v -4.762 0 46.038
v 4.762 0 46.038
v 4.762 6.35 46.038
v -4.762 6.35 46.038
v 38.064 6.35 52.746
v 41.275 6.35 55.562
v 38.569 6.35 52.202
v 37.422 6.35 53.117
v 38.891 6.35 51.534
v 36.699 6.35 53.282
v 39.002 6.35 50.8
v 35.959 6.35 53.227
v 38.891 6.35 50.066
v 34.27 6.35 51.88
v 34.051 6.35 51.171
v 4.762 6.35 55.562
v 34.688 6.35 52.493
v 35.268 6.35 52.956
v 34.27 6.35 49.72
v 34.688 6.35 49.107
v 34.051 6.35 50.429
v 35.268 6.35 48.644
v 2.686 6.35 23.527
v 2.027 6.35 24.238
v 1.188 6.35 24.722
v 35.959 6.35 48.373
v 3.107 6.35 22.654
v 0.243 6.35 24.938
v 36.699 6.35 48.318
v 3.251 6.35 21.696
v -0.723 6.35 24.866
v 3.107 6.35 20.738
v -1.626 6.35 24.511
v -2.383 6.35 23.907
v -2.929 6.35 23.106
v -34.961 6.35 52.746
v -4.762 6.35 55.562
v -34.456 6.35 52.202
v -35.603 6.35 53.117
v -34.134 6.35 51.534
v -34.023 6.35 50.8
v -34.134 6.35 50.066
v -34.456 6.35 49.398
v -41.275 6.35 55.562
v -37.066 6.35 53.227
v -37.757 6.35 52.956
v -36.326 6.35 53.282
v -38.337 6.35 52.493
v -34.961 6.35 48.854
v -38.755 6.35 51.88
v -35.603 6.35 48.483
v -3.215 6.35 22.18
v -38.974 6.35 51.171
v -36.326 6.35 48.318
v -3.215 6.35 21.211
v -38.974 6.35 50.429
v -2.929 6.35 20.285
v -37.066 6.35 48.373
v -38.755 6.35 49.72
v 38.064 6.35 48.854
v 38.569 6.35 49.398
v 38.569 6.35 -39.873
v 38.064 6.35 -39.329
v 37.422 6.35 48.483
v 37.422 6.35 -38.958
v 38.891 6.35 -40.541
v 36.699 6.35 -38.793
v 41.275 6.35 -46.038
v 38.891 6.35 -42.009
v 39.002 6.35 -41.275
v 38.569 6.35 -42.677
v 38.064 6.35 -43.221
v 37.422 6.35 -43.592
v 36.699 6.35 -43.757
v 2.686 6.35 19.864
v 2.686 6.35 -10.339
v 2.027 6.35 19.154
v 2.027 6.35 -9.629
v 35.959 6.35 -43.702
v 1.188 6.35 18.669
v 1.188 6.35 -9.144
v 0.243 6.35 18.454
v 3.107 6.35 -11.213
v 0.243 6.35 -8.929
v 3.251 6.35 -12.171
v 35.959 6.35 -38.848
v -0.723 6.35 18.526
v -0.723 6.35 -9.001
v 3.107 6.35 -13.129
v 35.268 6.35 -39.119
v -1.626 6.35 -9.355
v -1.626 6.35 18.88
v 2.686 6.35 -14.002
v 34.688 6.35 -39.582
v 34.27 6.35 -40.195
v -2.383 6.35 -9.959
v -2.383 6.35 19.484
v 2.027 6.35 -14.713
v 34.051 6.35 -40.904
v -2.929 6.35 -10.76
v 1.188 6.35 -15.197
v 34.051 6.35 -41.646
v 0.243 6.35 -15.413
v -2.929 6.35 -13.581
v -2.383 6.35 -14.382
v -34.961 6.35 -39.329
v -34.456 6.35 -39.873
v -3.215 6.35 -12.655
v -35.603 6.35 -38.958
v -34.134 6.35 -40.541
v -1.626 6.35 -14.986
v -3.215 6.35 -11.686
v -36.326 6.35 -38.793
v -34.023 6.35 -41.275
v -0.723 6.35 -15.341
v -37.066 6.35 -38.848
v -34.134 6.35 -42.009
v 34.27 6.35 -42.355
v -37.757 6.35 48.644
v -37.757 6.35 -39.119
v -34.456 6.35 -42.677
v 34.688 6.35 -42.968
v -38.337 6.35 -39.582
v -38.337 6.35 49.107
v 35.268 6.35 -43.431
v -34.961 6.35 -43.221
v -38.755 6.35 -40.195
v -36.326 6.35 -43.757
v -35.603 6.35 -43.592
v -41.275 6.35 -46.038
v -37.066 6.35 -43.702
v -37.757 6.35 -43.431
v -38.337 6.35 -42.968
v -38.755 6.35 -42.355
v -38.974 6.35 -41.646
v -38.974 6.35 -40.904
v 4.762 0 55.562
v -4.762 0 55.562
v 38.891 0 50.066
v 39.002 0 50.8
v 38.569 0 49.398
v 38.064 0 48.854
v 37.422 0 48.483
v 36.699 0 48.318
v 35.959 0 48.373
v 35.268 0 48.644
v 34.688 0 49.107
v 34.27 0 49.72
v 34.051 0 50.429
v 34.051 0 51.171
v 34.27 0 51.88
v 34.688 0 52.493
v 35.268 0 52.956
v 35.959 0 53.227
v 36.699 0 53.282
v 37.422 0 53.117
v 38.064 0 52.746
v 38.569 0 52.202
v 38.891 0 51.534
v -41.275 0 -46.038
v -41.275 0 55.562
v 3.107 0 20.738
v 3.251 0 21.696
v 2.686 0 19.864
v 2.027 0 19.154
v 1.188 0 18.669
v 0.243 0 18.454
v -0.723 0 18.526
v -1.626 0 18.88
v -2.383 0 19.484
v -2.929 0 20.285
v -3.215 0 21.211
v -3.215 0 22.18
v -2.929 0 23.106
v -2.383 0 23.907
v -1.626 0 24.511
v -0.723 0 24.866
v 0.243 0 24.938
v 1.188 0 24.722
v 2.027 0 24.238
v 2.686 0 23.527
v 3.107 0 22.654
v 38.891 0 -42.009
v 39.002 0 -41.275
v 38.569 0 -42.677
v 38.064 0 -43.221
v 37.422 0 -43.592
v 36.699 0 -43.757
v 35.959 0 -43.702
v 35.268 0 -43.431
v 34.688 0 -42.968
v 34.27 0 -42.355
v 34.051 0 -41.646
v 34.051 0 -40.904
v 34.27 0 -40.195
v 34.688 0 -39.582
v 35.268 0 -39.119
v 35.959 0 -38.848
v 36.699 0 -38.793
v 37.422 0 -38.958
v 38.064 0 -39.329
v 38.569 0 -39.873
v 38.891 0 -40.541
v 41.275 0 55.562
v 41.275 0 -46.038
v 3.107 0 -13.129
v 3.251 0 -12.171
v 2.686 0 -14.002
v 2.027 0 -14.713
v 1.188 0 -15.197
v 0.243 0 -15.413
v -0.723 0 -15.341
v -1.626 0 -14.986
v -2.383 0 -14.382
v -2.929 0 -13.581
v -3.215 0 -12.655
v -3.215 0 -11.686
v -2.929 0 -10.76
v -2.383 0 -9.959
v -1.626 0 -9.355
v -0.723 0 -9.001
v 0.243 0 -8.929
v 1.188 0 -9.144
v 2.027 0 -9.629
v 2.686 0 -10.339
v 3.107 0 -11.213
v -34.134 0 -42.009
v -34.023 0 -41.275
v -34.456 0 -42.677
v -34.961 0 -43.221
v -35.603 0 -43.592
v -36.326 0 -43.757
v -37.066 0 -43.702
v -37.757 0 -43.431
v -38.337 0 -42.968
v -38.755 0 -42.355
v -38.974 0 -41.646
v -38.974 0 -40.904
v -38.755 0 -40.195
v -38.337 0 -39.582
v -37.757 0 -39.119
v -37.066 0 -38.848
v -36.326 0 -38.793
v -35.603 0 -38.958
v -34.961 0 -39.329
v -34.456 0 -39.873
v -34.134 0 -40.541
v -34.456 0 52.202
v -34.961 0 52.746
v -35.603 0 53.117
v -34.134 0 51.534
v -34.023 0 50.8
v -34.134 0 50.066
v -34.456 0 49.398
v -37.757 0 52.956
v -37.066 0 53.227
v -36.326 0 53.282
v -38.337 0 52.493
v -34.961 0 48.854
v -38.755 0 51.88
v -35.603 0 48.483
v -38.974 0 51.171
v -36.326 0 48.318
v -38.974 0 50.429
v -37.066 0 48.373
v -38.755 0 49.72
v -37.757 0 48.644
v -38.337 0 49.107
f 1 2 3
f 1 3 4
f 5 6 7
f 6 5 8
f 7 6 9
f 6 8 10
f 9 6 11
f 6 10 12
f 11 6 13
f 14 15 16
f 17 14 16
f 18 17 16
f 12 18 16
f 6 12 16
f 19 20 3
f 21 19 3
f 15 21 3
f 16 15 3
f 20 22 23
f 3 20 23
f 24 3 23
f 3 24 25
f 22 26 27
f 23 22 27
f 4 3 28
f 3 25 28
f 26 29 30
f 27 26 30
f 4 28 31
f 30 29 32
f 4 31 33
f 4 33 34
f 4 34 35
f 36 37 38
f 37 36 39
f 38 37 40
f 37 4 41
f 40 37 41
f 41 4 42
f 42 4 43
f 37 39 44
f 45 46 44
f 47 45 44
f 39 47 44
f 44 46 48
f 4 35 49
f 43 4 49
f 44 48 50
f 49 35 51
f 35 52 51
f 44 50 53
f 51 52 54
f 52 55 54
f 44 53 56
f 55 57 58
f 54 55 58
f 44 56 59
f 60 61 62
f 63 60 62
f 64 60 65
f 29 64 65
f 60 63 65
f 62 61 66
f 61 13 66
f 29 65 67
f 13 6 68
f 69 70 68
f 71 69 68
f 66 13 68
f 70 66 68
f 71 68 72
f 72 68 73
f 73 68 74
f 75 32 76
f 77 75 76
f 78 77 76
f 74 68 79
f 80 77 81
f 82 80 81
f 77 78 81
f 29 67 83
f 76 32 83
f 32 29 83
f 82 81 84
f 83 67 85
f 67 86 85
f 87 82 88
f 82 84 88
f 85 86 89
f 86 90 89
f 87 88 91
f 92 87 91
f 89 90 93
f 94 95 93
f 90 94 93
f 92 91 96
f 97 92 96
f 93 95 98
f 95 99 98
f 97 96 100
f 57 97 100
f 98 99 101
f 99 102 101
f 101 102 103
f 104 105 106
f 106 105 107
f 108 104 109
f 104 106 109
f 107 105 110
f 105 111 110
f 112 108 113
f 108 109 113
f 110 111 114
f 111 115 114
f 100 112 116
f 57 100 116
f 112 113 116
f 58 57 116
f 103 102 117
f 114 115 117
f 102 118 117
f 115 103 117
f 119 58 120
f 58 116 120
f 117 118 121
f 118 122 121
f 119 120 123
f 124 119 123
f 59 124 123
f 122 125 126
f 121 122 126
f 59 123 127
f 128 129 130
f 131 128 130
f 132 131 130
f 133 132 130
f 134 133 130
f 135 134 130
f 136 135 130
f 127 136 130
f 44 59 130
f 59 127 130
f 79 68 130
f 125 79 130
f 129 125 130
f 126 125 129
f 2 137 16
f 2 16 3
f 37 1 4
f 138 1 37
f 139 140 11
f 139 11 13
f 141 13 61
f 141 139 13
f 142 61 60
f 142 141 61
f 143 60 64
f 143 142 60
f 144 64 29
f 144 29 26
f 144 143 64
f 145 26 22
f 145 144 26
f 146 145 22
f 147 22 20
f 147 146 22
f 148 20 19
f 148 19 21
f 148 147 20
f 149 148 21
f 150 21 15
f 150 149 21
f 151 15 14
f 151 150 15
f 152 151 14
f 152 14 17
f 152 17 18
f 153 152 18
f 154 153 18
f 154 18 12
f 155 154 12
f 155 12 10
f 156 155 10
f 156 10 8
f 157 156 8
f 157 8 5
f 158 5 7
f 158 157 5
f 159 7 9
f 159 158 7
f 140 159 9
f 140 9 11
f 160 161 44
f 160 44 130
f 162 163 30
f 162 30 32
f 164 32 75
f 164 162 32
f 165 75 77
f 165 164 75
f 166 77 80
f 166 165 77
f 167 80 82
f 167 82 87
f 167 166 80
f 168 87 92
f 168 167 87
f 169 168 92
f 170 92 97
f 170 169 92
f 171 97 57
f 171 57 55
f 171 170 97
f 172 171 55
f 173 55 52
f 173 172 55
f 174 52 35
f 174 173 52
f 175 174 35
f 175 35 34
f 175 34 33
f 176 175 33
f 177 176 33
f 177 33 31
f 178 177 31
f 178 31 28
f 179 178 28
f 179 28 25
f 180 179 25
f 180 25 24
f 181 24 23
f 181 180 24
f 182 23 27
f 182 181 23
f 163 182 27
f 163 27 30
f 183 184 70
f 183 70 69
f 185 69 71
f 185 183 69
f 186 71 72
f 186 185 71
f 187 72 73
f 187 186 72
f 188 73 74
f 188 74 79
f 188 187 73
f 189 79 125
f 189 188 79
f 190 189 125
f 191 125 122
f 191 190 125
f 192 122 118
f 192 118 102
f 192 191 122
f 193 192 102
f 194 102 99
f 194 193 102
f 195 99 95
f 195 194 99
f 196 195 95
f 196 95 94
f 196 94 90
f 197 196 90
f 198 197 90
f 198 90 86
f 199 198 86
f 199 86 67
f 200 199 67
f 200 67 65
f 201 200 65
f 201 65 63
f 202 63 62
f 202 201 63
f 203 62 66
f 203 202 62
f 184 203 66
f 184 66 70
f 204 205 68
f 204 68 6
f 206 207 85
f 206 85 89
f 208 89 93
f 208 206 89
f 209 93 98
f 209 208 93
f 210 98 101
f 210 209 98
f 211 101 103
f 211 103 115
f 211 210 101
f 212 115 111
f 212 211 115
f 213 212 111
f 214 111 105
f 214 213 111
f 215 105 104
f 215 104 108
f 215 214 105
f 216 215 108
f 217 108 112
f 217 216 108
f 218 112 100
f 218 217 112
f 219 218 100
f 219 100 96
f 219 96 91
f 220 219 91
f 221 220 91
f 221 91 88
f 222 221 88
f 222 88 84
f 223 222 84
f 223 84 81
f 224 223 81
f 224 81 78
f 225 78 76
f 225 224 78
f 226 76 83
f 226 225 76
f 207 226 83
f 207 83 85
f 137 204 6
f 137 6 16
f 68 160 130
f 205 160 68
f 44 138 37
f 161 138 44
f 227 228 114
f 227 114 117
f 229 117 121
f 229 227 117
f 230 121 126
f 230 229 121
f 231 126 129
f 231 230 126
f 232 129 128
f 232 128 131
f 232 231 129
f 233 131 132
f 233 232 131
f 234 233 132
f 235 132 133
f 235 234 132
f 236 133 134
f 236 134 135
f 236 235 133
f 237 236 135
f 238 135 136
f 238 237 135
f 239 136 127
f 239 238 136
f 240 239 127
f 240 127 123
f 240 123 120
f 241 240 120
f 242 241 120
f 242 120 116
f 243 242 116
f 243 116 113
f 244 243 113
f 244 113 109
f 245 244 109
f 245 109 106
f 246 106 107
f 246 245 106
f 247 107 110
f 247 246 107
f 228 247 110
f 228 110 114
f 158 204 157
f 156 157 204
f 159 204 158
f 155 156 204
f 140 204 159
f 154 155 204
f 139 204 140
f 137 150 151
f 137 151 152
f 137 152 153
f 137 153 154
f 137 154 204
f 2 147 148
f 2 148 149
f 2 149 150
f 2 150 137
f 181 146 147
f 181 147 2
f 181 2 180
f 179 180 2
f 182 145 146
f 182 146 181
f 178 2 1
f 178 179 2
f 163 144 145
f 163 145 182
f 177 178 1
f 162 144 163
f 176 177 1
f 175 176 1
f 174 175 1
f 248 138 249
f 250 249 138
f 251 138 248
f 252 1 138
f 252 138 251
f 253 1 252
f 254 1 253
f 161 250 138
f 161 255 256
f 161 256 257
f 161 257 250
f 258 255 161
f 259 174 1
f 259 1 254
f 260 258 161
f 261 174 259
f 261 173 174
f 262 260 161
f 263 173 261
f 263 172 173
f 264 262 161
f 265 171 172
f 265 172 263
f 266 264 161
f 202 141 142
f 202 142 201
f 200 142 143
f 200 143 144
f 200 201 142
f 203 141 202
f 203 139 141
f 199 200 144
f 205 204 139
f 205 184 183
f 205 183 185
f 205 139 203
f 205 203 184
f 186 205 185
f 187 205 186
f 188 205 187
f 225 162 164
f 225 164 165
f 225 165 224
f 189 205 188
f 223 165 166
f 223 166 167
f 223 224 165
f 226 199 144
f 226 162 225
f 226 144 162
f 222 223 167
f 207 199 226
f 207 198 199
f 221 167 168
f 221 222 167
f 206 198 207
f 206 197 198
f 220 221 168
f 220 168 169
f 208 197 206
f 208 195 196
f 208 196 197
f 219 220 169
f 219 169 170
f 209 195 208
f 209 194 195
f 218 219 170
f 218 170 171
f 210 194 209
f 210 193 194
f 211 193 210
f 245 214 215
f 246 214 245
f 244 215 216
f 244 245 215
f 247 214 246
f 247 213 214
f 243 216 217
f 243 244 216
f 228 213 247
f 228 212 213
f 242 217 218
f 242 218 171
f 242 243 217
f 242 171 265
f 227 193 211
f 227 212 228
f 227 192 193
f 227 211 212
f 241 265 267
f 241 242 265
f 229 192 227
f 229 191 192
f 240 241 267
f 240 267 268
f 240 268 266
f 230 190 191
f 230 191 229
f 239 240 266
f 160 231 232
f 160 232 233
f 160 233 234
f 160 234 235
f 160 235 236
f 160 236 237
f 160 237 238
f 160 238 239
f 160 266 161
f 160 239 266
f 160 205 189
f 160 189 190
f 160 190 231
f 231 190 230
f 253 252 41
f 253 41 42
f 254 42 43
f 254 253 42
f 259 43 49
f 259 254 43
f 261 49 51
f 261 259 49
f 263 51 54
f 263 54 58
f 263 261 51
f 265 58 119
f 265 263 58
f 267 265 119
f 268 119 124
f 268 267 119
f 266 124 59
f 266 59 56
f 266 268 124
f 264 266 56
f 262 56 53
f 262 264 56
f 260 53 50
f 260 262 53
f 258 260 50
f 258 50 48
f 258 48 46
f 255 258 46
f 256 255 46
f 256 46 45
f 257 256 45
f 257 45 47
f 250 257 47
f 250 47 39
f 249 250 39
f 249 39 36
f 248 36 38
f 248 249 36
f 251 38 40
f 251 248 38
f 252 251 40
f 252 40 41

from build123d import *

# Parameters (mm, degrees)
SKETCH1_R           = 2.4892
SKETCH1_R_2         = 3.2512
BOSS_EXTRUDE1_DEPTH = 6.35


with BuildPart() as part:
    # Sketch1 → Boss-Extrude1 (new body)
    with BuildSketch(Plane(origin=(0, 0, 0), x_dir=(1, 0, 0), z_dir=(0, 1, 0))):
        Polygon((-41.275, 46.0375), (41.275, 46.0375), (41.275, -55.5625), (4.7625, -55.5625), (4.7625, -46.0375), (-4.7625, -46.0375), (-4.7625, -55.5625), (-41.275, -55.5625), align=None)
        with Locations((-36.5125, 41.275)):
            Circle(SKETCH1_R, mode=Mode.SUBTRACT)
        with Locations((36.5125, 41.275)):
            Circle(SKETCH1_R, mode=Mode.SUBTRACT)
        with Locations((36.5125, -50.8)):
            Circle(SKETCH1_R, mode=Mode.SUBTRACT)
        with Locations((-36.5125, -50.8)):
            Circle(SKETCH1_R, mode=Mode.SUBTRACT)
        with Locations((0, 12.170833333)):
            Circle(SKETCH1_R_2, mode=Mode.SUBTRACT)
        with Locations((0, -21.695833333)):
            Circle(SKETCH1_R_2, mode=Mode.SUBTRACT)
    extrude(amount=BOSS_EXTRUDE1_DEPTH)


solid = part.part
